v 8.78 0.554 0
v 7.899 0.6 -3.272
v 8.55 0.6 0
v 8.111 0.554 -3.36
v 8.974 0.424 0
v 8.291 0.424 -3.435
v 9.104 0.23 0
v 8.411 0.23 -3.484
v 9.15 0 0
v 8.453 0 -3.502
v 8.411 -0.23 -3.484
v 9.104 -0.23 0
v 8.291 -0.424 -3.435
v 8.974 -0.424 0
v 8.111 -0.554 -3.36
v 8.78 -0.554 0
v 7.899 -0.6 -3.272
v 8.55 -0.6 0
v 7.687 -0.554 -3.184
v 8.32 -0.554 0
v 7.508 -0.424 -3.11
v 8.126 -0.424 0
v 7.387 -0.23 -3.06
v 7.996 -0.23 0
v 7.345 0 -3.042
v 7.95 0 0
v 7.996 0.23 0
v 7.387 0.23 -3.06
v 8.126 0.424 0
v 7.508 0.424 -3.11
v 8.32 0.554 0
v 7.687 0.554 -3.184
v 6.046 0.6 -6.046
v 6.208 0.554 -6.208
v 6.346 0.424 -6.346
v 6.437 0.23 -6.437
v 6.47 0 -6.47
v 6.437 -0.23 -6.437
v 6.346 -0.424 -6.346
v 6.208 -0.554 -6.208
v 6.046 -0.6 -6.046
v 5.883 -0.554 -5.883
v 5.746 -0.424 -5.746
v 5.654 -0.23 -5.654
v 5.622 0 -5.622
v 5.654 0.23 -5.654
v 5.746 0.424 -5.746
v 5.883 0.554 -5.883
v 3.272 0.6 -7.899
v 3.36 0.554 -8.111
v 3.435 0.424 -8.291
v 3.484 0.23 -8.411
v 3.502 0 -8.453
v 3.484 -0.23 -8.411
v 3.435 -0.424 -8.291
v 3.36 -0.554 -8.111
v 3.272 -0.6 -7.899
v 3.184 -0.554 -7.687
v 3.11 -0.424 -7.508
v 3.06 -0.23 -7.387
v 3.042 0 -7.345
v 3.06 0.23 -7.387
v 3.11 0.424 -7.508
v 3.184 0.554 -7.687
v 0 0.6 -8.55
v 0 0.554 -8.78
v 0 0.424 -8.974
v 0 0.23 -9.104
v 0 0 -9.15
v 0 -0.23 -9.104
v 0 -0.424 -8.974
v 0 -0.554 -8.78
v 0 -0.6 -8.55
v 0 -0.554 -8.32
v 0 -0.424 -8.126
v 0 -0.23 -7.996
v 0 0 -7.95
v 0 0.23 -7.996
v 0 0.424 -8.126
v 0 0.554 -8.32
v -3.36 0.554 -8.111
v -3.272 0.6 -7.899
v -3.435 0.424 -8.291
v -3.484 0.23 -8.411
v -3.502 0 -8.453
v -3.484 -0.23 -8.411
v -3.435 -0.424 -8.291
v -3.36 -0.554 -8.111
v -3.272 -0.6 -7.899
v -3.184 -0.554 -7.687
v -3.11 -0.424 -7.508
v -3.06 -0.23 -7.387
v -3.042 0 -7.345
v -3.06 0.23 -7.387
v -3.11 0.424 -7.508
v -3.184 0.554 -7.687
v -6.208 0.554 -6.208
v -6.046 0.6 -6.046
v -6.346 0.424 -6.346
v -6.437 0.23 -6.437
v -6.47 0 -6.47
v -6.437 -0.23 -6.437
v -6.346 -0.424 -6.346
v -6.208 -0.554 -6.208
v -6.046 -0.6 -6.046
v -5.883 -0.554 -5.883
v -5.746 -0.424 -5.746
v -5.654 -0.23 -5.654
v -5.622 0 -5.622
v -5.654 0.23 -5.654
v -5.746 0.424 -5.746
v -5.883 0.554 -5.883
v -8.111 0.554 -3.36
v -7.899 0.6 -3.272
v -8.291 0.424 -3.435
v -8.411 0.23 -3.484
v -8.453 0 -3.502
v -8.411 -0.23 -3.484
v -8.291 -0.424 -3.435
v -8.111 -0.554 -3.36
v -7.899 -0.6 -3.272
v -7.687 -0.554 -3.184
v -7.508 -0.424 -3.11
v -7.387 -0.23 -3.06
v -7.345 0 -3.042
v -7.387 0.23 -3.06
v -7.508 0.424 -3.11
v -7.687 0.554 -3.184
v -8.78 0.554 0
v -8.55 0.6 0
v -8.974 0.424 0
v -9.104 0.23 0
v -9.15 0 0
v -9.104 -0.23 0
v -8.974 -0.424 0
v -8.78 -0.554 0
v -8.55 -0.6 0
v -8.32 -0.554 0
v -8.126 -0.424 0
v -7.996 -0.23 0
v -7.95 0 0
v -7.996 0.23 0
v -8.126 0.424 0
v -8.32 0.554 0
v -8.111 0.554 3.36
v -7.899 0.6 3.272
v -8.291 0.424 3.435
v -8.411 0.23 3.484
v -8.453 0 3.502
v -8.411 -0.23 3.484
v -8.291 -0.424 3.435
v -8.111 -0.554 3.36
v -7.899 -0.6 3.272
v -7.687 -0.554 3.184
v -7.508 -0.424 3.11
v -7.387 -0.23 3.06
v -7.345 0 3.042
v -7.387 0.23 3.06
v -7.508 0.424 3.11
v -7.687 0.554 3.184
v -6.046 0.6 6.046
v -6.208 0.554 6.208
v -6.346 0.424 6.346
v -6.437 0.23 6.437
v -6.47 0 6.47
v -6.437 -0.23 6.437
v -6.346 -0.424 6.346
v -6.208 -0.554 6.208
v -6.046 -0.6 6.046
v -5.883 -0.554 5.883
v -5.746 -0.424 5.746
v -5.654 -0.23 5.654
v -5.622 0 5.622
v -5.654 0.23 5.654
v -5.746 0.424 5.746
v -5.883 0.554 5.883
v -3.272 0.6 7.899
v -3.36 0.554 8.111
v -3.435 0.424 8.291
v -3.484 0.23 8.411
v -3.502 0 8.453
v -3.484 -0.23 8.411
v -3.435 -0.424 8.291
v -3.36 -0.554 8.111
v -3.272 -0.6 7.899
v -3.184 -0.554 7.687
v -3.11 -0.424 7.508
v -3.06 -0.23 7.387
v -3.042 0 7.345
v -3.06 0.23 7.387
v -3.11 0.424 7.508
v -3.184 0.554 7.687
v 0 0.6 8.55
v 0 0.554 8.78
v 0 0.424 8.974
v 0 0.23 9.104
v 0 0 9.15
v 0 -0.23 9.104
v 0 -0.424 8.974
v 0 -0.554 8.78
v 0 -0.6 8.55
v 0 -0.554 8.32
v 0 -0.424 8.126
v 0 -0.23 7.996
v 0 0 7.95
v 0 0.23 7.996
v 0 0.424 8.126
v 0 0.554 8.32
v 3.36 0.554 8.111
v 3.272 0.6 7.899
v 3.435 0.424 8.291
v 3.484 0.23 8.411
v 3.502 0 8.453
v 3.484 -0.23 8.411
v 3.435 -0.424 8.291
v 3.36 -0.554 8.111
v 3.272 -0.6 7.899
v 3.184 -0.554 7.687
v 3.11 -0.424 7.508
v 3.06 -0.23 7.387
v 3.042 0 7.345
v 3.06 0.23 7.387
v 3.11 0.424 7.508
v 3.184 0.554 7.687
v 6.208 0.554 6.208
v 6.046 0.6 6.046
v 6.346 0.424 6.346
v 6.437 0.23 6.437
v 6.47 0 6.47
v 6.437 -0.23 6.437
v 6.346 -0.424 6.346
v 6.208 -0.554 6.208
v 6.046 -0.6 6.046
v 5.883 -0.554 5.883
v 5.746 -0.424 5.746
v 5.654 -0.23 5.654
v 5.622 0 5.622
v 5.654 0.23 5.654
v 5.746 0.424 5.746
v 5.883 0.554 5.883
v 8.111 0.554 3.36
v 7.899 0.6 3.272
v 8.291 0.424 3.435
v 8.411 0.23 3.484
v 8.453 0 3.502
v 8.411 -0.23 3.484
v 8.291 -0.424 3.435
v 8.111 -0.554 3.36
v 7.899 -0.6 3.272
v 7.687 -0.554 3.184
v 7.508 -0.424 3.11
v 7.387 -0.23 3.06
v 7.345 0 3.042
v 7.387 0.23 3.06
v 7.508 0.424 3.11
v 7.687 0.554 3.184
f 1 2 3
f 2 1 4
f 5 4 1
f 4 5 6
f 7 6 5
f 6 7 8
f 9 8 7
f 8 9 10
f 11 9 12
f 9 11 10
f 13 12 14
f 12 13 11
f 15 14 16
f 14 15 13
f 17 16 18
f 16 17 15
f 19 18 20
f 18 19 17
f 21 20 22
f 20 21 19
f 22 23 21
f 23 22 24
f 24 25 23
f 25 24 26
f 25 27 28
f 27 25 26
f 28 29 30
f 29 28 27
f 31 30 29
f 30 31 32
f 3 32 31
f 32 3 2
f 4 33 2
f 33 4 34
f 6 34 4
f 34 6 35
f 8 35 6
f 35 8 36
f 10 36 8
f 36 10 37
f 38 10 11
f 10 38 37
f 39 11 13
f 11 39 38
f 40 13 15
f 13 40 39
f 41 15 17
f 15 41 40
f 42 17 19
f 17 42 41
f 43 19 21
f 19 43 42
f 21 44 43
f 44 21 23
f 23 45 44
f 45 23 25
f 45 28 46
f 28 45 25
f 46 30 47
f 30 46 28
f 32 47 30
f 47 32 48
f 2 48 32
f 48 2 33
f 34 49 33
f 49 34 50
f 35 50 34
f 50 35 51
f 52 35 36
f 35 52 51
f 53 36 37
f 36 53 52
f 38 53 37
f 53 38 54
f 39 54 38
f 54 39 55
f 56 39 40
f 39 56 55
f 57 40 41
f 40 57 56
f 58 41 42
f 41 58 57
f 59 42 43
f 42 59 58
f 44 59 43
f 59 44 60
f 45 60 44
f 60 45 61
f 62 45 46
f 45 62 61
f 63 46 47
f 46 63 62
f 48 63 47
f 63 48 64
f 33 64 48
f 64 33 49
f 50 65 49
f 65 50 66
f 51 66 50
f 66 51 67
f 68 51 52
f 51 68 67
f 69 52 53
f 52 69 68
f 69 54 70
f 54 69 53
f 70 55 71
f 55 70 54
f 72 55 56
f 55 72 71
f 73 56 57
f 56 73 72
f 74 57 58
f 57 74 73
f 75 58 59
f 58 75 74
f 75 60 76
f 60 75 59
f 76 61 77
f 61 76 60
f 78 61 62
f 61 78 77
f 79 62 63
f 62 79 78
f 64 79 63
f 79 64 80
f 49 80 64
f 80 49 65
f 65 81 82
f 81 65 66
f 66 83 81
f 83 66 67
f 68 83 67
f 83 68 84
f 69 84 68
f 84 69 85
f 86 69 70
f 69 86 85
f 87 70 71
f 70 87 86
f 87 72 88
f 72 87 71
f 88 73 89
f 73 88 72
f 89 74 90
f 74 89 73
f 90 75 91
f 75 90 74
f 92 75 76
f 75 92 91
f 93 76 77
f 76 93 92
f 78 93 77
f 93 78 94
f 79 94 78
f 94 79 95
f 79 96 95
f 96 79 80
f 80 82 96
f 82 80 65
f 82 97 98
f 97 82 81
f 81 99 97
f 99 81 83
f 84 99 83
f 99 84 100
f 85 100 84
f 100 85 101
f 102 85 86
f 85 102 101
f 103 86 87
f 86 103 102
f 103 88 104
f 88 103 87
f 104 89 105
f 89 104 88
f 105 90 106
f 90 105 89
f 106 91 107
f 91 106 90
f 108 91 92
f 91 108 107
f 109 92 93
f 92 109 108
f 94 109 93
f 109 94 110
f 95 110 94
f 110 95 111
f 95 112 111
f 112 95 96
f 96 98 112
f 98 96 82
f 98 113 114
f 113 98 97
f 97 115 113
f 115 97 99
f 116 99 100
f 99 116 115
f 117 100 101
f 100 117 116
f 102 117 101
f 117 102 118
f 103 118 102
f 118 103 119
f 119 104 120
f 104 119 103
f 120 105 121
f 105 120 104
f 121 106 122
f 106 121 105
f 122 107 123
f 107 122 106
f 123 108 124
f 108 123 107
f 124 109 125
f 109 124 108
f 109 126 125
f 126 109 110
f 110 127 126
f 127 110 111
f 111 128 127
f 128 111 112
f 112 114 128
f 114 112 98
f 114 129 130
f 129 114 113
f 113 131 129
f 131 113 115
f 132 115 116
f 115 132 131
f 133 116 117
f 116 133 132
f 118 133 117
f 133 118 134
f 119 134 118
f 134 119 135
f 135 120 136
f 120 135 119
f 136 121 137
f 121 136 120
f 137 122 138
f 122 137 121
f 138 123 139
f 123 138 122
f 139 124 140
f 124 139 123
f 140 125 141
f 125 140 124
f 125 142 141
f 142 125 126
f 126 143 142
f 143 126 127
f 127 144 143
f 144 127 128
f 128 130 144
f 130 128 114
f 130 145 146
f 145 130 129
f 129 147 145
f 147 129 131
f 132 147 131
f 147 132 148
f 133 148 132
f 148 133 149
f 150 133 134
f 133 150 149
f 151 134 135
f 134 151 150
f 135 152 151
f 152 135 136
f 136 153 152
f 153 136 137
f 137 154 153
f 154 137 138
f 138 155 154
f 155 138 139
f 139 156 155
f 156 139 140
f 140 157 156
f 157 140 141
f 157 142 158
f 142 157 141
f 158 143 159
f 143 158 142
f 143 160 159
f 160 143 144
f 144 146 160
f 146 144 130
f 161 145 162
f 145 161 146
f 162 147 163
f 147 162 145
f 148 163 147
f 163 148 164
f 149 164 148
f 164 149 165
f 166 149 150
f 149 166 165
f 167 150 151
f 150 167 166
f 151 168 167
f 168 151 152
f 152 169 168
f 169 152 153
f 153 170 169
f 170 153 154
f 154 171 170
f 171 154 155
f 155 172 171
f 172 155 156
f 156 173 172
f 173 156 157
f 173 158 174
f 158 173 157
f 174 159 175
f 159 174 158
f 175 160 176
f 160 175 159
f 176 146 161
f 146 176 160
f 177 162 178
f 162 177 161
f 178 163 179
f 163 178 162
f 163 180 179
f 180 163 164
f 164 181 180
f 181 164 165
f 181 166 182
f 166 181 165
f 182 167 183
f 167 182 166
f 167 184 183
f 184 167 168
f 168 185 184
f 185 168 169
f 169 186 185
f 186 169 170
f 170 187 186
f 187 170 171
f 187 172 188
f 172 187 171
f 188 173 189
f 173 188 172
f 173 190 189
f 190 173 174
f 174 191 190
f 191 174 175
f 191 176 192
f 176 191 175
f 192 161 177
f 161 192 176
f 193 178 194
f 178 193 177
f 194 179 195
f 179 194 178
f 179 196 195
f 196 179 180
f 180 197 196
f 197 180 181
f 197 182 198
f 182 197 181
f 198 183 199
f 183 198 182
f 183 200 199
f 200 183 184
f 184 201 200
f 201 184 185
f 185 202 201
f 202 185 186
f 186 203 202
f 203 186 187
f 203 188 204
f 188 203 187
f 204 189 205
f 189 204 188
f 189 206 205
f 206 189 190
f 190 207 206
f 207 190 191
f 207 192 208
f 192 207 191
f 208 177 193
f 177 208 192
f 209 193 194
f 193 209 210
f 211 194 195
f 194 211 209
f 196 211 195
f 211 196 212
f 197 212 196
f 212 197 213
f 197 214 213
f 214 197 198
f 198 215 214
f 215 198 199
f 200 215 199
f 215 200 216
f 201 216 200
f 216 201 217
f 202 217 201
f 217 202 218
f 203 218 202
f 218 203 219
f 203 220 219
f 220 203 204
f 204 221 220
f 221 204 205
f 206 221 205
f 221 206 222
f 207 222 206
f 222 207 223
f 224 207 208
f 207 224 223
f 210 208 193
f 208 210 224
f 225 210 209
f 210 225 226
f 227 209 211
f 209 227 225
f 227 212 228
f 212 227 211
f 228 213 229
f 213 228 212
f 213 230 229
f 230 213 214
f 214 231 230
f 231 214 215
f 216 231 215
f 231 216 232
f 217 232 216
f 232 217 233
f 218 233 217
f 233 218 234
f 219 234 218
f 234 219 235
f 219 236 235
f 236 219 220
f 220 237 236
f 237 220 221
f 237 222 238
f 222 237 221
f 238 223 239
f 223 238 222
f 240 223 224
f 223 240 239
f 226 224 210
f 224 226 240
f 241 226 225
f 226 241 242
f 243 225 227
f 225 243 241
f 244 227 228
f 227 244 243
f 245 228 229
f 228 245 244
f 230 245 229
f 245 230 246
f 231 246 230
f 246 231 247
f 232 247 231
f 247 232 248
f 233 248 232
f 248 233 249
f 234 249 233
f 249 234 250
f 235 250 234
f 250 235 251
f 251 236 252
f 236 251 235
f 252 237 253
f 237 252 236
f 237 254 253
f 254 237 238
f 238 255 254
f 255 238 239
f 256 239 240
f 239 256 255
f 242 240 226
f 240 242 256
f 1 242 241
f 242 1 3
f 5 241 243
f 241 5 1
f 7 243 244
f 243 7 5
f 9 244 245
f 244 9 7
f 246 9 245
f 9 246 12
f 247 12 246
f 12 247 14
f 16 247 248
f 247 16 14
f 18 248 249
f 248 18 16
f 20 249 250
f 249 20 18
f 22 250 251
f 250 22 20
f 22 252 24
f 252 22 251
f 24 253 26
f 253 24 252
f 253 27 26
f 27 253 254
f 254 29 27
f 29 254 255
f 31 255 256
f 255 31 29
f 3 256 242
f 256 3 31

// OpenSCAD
use <../lib.scad>
use <../p/t01q0702.scad>
function ldraw_lib__u9242() = [
// 0 ~Rubber Ring for Train Wheel for RC Train with Technic Axle Hole
// 0 Name: u9242.dat
// 0 Author: Matthew J. Chiles [mchiles]
// 0 !LDRAW_ORG Part UPDATE 2013-02
// 0 !LICENSE Licensed under CC BY 2.0 and CC BY 4.0 : see CAreadme.txt
// 
// 0 BFC CERTIFY CCW
  [0,"BFC","CERTIFY"],
  [0,"BFC","CCW"],
// 
// 0 !CATEGORY Train
// 
// 0 !CMDLINE -c67
// 
// 0 !HISTORY 2013-07-01 [MMR1988] Changed to new dimensions of u9241.dat
// 0 !HISTORY 2013-12-23 [PTadmin] Official Update 2013-02
// 
// 
// 1 16 0 0 0 21.375 0 0 0 0 21.375 0 21.375 0 t01q0702.dat
  [1,16,0,0,0,21.375,0,0,0,0,21.375,0,21.375,0, ldraw_lib__t01q0702()],
];
makepoly(ldraw_lib__u9242(), line=0.2);
